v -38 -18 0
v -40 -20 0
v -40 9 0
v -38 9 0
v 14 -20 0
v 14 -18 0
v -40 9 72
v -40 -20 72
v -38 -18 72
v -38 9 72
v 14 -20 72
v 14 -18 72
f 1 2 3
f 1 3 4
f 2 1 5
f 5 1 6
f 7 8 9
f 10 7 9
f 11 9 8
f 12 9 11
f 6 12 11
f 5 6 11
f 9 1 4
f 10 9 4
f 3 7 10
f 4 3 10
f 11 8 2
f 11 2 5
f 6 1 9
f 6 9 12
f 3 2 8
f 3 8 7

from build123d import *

# Parameters (mm, degrees)
SKETCH_1_W          = 80
SKETCH_1_H          = 40
SKETCH_1_W_2        = 76
SKETCH_1_H_2        = 36
EXTRUDE_1_DEPTH     = 72
CUT_EXTRUDE_1_DEPTH = 73


with BuildPart() as part:
    # Эскиз1 → Бобышка-Вытянуть1 (new body)
    with BuildSketch(Plane.XY):
        Rectangle(SKETCH_1_W, SKETCH_1_H)
        Rectangle(SKETCH_1_W_2, SKETCH_1_H_2, mode=Mode.SUBTRACT)
    extrude(amount=EXTRUDE_1_DEPTH)

    # Эскиз2 → Вырез-Вытянуть1 (cut, through all)
    with BuildSketch(Plane.XY.offset(72)):
        Polygon((-40, 20), (-40, 9), (-38, 9), (-38, 18), (38, 18), (38, -18), (14, -18), (14, -20), (40, -20), (40, 20), align=None)
    extrude(amount=-CUT_EXTRUDE_1_DEPTH, mode=Mode.SUBTRACT)


solid = part.part
